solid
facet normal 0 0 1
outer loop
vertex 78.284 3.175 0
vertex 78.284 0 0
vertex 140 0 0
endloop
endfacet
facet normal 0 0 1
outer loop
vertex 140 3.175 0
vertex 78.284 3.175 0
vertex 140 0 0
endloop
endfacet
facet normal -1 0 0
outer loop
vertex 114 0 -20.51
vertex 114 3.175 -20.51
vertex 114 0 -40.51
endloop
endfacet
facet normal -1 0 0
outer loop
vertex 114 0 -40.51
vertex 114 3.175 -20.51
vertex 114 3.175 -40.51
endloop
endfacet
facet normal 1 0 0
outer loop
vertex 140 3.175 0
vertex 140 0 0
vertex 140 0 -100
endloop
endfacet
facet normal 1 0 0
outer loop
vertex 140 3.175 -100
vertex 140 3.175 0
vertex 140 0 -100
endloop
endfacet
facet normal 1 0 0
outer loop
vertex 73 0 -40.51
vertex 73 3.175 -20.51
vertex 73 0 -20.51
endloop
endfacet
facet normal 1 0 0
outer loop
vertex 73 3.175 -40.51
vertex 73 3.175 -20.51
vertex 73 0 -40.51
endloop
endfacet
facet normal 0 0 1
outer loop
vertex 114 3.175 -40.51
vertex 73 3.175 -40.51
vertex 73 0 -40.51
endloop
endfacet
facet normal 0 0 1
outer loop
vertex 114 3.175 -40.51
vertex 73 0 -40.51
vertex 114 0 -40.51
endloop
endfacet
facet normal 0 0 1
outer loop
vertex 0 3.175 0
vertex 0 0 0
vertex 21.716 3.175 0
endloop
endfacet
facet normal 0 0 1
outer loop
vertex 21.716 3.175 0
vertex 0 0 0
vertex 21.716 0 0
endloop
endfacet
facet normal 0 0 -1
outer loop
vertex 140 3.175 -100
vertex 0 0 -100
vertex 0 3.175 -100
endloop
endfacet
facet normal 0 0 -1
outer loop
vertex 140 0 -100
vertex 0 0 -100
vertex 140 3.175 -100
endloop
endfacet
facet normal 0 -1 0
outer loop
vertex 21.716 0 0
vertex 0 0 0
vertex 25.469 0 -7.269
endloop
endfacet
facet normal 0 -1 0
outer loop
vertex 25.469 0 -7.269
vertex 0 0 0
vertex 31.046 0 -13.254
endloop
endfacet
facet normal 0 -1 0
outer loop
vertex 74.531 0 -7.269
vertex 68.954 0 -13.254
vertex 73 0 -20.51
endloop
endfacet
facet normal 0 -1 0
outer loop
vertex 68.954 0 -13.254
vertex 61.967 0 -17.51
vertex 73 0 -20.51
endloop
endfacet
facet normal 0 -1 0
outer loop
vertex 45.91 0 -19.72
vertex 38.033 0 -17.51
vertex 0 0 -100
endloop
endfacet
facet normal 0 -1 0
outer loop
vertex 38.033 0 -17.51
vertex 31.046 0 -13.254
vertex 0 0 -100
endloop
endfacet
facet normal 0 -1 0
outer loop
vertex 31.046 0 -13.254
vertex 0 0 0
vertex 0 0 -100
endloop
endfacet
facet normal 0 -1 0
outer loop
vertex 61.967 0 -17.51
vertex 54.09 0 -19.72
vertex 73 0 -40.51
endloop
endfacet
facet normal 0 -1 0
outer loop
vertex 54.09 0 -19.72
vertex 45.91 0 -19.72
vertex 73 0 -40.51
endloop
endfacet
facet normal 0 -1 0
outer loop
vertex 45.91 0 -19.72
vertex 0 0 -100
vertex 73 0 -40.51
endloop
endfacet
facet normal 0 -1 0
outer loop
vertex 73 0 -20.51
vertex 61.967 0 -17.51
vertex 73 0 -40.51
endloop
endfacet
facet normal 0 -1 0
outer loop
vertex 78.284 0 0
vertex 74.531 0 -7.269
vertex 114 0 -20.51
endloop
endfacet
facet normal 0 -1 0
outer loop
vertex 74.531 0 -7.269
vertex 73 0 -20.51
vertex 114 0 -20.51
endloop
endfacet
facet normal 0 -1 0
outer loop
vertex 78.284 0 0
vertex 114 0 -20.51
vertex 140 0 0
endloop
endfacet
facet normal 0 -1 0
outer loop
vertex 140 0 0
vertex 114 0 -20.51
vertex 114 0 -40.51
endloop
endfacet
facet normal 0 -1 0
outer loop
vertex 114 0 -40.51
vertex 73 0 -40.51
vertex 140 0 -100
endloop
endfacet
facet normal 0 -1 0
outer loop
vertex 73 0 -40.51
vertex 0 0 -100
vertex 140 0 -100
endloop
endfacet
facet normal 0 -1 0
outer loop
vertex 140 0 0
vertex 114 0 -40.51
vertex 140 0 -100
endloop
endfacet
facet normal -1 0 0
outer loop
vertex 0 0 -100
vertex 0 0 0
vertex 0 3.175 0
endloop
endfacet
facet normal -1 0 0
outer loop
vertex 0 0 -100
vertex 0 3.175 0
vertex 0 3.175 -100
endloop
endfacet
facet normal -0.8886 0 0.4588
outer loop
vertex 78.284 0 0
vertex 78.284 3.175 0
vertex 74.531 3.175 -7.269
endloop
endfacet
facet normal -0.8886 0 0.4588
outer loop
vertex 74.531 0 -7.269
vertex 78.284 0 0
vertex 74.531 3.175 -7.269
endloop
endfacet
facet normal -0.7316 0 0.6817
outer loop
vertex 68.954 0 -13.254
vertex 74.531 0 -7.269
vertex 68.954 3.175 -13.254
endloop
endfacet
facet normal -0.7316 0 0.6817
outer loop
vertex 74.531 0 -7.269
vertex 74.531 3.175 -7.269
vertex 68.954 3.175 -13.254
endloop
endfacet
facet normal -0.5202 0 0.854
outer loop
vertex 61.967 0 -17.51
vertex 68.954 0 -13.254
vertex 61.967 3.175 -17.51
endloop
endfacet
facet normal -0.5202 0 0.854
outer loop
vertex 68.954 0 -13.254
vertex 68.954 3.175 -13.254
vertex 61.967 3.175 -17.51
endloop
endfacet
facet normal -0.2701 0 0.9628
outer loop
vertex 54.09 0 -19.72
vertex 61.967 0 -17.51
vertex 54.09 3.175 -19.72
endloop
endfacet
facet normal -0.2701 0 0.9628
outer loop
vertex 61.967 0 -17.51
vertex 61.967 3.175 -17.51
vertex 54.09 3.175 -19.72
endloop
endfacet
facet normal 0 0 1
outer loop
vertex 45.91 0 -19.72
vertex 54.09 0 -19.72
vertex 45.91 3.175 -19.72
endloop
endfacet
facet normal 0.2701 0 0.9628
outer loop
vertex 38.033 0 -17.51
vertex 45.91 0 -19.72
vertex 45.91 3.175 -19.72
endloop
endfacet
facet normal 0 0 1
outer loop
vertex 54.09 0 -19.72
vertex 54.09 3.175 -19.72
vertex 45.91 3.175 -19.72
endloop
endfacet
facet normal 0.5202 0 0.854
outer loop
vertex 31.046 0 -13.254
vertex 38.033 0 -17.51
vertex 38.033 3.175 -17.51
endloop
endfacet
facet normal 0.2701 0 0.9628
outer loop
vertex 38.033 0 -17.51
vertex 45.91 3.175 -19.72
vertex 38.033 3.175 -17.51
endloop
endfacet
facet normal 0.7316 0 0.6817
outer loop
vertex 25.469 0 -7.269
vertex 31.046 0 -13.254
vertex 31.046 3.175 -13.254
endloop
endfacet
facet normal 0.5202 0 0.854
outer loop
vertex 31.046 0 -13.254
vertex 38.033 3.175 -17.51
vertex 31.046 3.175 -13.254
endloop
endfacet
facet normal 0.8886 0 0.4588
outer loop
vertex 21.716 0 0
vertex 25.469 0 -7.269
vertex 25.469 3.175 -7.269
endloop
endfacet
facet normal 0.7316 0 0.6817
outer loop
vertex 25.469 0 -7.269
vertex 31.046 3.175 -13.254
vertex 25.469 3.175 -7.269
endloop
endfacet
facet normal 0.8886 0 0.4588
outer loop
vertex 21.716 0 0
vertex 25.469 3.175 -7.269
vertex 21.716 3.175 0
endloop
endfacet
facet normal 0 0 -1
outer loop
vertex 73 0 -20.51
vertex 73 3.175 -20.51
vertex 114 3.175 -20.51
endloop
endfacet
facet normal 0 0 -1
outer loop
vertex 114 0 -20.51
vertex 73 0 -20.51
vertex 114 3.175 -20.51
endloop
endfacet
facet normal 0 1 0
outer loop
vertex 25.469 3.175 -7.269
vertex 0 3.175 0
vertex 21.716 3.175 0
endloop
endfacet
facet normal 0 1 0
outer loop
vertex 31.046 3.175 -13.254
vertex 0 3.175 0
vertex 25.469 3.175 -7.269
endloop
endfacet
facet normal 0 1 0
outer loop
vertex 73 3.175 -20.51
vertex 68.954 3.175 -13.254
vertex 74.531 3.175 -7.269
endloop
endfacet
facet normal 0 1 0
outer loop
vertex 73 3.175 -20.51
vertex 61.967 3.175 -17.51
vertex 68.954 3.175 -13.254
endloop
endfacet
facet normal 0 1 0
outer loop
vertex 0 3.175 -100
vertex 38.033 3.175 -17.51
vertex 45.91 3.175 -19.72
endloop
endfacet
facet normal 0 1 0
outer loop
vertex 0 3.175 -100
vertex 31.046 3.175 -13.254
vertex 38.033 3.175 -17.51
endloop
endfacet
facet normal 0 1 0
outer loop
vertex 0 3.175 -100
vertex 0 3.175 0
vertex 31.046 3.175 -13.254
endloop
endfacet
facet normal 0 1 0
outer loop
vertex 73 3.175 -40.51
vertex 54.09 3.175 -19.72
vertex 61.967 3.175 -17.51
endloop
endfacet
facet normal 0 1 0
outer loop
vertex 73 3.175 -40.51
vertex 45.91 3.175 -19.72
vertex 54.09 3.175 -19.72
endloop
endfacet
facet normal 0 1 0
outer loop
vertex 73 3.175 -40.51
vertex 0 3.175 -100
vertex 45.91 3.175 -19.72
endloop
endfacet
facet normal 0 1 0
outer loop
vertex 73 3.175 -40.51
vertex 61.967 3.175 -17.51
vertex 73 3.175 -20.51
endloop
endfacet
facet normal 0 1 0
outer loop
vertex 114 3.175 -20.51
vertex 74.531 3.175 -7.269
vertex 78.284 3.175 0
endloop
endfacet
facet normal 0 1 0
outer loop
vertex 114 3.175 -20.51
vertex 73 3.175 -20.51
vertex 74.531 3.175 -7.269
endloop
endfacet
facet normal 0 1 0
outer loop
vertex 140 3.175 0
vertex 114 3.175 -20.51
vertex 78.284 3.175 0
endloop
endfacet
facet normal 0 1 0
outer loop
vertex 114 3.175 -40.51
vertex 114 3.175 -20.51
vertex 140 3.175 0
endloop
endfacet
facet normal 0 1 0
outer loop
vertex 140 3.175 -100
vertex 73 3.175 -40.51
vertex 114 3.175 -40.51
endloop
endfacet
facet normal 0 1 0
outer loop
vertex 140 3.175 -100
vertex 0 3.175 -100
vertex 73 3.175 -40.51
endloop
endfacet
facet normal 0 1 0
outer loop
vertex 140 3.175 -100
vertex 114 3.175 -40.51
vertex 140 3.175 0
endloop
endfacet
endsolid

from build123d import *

# Parameters (mm, degrees)
SKETCH1_W           = 140
SKETCH1_H           = 100
BOSS_EXTRUDE1_DEPTH = 3.175
SKETCH2_W           = 41
SKETCH2_H           = 20
CUT_EXTRUDE1_DEPTH  = 10
SKETCH3_R           = 30
CUT_EXTRUDE2_DEPTH  = 10


with BuildPart() as part:
    # Sketch1 → Boss-Extrude1 (new body)
    with BuildSketch(Plane(origin=(0, 0, 0), x_dir=(1, 0, 0), z_dir=(0, 1, 0))):
        with Locations((70, 50)):
            Rectangle(SKETCH1_W, SKETCH1_H)
    extrude(amount=BOSS_EXTRUDE1_DEPTH)

    # Sketch2 → Cut-Extrude1 (cut)
    with BuildSketch(Plane(origin=(0, 3.175, 0), x_dir=(1, 0, 0), z_dir=(0, 1, 0))):
        with Locations((93.5, 30.51)):
            Rectangle(SKETCH2_W, SKETCH2_H)
    extrude(amount=-CUT_EXTRUDE1_DEPTH, mode=Mode.SUBTRACT)

    # Sketch3 → Cut-Extrude2 (cut)
    with BuildSketch(Plane(origin=(0, 3.175, 0), x_dir=(1, 0, 0), z_dir=(0, 1, 0))):
        with Locations((50, -10)):
            Circle(SKETCH3_R)
    extrude(amount=-CUT_EXTRUDE2_DEPTH, mode=Mode.SUBTRACT)


solid = part.part
